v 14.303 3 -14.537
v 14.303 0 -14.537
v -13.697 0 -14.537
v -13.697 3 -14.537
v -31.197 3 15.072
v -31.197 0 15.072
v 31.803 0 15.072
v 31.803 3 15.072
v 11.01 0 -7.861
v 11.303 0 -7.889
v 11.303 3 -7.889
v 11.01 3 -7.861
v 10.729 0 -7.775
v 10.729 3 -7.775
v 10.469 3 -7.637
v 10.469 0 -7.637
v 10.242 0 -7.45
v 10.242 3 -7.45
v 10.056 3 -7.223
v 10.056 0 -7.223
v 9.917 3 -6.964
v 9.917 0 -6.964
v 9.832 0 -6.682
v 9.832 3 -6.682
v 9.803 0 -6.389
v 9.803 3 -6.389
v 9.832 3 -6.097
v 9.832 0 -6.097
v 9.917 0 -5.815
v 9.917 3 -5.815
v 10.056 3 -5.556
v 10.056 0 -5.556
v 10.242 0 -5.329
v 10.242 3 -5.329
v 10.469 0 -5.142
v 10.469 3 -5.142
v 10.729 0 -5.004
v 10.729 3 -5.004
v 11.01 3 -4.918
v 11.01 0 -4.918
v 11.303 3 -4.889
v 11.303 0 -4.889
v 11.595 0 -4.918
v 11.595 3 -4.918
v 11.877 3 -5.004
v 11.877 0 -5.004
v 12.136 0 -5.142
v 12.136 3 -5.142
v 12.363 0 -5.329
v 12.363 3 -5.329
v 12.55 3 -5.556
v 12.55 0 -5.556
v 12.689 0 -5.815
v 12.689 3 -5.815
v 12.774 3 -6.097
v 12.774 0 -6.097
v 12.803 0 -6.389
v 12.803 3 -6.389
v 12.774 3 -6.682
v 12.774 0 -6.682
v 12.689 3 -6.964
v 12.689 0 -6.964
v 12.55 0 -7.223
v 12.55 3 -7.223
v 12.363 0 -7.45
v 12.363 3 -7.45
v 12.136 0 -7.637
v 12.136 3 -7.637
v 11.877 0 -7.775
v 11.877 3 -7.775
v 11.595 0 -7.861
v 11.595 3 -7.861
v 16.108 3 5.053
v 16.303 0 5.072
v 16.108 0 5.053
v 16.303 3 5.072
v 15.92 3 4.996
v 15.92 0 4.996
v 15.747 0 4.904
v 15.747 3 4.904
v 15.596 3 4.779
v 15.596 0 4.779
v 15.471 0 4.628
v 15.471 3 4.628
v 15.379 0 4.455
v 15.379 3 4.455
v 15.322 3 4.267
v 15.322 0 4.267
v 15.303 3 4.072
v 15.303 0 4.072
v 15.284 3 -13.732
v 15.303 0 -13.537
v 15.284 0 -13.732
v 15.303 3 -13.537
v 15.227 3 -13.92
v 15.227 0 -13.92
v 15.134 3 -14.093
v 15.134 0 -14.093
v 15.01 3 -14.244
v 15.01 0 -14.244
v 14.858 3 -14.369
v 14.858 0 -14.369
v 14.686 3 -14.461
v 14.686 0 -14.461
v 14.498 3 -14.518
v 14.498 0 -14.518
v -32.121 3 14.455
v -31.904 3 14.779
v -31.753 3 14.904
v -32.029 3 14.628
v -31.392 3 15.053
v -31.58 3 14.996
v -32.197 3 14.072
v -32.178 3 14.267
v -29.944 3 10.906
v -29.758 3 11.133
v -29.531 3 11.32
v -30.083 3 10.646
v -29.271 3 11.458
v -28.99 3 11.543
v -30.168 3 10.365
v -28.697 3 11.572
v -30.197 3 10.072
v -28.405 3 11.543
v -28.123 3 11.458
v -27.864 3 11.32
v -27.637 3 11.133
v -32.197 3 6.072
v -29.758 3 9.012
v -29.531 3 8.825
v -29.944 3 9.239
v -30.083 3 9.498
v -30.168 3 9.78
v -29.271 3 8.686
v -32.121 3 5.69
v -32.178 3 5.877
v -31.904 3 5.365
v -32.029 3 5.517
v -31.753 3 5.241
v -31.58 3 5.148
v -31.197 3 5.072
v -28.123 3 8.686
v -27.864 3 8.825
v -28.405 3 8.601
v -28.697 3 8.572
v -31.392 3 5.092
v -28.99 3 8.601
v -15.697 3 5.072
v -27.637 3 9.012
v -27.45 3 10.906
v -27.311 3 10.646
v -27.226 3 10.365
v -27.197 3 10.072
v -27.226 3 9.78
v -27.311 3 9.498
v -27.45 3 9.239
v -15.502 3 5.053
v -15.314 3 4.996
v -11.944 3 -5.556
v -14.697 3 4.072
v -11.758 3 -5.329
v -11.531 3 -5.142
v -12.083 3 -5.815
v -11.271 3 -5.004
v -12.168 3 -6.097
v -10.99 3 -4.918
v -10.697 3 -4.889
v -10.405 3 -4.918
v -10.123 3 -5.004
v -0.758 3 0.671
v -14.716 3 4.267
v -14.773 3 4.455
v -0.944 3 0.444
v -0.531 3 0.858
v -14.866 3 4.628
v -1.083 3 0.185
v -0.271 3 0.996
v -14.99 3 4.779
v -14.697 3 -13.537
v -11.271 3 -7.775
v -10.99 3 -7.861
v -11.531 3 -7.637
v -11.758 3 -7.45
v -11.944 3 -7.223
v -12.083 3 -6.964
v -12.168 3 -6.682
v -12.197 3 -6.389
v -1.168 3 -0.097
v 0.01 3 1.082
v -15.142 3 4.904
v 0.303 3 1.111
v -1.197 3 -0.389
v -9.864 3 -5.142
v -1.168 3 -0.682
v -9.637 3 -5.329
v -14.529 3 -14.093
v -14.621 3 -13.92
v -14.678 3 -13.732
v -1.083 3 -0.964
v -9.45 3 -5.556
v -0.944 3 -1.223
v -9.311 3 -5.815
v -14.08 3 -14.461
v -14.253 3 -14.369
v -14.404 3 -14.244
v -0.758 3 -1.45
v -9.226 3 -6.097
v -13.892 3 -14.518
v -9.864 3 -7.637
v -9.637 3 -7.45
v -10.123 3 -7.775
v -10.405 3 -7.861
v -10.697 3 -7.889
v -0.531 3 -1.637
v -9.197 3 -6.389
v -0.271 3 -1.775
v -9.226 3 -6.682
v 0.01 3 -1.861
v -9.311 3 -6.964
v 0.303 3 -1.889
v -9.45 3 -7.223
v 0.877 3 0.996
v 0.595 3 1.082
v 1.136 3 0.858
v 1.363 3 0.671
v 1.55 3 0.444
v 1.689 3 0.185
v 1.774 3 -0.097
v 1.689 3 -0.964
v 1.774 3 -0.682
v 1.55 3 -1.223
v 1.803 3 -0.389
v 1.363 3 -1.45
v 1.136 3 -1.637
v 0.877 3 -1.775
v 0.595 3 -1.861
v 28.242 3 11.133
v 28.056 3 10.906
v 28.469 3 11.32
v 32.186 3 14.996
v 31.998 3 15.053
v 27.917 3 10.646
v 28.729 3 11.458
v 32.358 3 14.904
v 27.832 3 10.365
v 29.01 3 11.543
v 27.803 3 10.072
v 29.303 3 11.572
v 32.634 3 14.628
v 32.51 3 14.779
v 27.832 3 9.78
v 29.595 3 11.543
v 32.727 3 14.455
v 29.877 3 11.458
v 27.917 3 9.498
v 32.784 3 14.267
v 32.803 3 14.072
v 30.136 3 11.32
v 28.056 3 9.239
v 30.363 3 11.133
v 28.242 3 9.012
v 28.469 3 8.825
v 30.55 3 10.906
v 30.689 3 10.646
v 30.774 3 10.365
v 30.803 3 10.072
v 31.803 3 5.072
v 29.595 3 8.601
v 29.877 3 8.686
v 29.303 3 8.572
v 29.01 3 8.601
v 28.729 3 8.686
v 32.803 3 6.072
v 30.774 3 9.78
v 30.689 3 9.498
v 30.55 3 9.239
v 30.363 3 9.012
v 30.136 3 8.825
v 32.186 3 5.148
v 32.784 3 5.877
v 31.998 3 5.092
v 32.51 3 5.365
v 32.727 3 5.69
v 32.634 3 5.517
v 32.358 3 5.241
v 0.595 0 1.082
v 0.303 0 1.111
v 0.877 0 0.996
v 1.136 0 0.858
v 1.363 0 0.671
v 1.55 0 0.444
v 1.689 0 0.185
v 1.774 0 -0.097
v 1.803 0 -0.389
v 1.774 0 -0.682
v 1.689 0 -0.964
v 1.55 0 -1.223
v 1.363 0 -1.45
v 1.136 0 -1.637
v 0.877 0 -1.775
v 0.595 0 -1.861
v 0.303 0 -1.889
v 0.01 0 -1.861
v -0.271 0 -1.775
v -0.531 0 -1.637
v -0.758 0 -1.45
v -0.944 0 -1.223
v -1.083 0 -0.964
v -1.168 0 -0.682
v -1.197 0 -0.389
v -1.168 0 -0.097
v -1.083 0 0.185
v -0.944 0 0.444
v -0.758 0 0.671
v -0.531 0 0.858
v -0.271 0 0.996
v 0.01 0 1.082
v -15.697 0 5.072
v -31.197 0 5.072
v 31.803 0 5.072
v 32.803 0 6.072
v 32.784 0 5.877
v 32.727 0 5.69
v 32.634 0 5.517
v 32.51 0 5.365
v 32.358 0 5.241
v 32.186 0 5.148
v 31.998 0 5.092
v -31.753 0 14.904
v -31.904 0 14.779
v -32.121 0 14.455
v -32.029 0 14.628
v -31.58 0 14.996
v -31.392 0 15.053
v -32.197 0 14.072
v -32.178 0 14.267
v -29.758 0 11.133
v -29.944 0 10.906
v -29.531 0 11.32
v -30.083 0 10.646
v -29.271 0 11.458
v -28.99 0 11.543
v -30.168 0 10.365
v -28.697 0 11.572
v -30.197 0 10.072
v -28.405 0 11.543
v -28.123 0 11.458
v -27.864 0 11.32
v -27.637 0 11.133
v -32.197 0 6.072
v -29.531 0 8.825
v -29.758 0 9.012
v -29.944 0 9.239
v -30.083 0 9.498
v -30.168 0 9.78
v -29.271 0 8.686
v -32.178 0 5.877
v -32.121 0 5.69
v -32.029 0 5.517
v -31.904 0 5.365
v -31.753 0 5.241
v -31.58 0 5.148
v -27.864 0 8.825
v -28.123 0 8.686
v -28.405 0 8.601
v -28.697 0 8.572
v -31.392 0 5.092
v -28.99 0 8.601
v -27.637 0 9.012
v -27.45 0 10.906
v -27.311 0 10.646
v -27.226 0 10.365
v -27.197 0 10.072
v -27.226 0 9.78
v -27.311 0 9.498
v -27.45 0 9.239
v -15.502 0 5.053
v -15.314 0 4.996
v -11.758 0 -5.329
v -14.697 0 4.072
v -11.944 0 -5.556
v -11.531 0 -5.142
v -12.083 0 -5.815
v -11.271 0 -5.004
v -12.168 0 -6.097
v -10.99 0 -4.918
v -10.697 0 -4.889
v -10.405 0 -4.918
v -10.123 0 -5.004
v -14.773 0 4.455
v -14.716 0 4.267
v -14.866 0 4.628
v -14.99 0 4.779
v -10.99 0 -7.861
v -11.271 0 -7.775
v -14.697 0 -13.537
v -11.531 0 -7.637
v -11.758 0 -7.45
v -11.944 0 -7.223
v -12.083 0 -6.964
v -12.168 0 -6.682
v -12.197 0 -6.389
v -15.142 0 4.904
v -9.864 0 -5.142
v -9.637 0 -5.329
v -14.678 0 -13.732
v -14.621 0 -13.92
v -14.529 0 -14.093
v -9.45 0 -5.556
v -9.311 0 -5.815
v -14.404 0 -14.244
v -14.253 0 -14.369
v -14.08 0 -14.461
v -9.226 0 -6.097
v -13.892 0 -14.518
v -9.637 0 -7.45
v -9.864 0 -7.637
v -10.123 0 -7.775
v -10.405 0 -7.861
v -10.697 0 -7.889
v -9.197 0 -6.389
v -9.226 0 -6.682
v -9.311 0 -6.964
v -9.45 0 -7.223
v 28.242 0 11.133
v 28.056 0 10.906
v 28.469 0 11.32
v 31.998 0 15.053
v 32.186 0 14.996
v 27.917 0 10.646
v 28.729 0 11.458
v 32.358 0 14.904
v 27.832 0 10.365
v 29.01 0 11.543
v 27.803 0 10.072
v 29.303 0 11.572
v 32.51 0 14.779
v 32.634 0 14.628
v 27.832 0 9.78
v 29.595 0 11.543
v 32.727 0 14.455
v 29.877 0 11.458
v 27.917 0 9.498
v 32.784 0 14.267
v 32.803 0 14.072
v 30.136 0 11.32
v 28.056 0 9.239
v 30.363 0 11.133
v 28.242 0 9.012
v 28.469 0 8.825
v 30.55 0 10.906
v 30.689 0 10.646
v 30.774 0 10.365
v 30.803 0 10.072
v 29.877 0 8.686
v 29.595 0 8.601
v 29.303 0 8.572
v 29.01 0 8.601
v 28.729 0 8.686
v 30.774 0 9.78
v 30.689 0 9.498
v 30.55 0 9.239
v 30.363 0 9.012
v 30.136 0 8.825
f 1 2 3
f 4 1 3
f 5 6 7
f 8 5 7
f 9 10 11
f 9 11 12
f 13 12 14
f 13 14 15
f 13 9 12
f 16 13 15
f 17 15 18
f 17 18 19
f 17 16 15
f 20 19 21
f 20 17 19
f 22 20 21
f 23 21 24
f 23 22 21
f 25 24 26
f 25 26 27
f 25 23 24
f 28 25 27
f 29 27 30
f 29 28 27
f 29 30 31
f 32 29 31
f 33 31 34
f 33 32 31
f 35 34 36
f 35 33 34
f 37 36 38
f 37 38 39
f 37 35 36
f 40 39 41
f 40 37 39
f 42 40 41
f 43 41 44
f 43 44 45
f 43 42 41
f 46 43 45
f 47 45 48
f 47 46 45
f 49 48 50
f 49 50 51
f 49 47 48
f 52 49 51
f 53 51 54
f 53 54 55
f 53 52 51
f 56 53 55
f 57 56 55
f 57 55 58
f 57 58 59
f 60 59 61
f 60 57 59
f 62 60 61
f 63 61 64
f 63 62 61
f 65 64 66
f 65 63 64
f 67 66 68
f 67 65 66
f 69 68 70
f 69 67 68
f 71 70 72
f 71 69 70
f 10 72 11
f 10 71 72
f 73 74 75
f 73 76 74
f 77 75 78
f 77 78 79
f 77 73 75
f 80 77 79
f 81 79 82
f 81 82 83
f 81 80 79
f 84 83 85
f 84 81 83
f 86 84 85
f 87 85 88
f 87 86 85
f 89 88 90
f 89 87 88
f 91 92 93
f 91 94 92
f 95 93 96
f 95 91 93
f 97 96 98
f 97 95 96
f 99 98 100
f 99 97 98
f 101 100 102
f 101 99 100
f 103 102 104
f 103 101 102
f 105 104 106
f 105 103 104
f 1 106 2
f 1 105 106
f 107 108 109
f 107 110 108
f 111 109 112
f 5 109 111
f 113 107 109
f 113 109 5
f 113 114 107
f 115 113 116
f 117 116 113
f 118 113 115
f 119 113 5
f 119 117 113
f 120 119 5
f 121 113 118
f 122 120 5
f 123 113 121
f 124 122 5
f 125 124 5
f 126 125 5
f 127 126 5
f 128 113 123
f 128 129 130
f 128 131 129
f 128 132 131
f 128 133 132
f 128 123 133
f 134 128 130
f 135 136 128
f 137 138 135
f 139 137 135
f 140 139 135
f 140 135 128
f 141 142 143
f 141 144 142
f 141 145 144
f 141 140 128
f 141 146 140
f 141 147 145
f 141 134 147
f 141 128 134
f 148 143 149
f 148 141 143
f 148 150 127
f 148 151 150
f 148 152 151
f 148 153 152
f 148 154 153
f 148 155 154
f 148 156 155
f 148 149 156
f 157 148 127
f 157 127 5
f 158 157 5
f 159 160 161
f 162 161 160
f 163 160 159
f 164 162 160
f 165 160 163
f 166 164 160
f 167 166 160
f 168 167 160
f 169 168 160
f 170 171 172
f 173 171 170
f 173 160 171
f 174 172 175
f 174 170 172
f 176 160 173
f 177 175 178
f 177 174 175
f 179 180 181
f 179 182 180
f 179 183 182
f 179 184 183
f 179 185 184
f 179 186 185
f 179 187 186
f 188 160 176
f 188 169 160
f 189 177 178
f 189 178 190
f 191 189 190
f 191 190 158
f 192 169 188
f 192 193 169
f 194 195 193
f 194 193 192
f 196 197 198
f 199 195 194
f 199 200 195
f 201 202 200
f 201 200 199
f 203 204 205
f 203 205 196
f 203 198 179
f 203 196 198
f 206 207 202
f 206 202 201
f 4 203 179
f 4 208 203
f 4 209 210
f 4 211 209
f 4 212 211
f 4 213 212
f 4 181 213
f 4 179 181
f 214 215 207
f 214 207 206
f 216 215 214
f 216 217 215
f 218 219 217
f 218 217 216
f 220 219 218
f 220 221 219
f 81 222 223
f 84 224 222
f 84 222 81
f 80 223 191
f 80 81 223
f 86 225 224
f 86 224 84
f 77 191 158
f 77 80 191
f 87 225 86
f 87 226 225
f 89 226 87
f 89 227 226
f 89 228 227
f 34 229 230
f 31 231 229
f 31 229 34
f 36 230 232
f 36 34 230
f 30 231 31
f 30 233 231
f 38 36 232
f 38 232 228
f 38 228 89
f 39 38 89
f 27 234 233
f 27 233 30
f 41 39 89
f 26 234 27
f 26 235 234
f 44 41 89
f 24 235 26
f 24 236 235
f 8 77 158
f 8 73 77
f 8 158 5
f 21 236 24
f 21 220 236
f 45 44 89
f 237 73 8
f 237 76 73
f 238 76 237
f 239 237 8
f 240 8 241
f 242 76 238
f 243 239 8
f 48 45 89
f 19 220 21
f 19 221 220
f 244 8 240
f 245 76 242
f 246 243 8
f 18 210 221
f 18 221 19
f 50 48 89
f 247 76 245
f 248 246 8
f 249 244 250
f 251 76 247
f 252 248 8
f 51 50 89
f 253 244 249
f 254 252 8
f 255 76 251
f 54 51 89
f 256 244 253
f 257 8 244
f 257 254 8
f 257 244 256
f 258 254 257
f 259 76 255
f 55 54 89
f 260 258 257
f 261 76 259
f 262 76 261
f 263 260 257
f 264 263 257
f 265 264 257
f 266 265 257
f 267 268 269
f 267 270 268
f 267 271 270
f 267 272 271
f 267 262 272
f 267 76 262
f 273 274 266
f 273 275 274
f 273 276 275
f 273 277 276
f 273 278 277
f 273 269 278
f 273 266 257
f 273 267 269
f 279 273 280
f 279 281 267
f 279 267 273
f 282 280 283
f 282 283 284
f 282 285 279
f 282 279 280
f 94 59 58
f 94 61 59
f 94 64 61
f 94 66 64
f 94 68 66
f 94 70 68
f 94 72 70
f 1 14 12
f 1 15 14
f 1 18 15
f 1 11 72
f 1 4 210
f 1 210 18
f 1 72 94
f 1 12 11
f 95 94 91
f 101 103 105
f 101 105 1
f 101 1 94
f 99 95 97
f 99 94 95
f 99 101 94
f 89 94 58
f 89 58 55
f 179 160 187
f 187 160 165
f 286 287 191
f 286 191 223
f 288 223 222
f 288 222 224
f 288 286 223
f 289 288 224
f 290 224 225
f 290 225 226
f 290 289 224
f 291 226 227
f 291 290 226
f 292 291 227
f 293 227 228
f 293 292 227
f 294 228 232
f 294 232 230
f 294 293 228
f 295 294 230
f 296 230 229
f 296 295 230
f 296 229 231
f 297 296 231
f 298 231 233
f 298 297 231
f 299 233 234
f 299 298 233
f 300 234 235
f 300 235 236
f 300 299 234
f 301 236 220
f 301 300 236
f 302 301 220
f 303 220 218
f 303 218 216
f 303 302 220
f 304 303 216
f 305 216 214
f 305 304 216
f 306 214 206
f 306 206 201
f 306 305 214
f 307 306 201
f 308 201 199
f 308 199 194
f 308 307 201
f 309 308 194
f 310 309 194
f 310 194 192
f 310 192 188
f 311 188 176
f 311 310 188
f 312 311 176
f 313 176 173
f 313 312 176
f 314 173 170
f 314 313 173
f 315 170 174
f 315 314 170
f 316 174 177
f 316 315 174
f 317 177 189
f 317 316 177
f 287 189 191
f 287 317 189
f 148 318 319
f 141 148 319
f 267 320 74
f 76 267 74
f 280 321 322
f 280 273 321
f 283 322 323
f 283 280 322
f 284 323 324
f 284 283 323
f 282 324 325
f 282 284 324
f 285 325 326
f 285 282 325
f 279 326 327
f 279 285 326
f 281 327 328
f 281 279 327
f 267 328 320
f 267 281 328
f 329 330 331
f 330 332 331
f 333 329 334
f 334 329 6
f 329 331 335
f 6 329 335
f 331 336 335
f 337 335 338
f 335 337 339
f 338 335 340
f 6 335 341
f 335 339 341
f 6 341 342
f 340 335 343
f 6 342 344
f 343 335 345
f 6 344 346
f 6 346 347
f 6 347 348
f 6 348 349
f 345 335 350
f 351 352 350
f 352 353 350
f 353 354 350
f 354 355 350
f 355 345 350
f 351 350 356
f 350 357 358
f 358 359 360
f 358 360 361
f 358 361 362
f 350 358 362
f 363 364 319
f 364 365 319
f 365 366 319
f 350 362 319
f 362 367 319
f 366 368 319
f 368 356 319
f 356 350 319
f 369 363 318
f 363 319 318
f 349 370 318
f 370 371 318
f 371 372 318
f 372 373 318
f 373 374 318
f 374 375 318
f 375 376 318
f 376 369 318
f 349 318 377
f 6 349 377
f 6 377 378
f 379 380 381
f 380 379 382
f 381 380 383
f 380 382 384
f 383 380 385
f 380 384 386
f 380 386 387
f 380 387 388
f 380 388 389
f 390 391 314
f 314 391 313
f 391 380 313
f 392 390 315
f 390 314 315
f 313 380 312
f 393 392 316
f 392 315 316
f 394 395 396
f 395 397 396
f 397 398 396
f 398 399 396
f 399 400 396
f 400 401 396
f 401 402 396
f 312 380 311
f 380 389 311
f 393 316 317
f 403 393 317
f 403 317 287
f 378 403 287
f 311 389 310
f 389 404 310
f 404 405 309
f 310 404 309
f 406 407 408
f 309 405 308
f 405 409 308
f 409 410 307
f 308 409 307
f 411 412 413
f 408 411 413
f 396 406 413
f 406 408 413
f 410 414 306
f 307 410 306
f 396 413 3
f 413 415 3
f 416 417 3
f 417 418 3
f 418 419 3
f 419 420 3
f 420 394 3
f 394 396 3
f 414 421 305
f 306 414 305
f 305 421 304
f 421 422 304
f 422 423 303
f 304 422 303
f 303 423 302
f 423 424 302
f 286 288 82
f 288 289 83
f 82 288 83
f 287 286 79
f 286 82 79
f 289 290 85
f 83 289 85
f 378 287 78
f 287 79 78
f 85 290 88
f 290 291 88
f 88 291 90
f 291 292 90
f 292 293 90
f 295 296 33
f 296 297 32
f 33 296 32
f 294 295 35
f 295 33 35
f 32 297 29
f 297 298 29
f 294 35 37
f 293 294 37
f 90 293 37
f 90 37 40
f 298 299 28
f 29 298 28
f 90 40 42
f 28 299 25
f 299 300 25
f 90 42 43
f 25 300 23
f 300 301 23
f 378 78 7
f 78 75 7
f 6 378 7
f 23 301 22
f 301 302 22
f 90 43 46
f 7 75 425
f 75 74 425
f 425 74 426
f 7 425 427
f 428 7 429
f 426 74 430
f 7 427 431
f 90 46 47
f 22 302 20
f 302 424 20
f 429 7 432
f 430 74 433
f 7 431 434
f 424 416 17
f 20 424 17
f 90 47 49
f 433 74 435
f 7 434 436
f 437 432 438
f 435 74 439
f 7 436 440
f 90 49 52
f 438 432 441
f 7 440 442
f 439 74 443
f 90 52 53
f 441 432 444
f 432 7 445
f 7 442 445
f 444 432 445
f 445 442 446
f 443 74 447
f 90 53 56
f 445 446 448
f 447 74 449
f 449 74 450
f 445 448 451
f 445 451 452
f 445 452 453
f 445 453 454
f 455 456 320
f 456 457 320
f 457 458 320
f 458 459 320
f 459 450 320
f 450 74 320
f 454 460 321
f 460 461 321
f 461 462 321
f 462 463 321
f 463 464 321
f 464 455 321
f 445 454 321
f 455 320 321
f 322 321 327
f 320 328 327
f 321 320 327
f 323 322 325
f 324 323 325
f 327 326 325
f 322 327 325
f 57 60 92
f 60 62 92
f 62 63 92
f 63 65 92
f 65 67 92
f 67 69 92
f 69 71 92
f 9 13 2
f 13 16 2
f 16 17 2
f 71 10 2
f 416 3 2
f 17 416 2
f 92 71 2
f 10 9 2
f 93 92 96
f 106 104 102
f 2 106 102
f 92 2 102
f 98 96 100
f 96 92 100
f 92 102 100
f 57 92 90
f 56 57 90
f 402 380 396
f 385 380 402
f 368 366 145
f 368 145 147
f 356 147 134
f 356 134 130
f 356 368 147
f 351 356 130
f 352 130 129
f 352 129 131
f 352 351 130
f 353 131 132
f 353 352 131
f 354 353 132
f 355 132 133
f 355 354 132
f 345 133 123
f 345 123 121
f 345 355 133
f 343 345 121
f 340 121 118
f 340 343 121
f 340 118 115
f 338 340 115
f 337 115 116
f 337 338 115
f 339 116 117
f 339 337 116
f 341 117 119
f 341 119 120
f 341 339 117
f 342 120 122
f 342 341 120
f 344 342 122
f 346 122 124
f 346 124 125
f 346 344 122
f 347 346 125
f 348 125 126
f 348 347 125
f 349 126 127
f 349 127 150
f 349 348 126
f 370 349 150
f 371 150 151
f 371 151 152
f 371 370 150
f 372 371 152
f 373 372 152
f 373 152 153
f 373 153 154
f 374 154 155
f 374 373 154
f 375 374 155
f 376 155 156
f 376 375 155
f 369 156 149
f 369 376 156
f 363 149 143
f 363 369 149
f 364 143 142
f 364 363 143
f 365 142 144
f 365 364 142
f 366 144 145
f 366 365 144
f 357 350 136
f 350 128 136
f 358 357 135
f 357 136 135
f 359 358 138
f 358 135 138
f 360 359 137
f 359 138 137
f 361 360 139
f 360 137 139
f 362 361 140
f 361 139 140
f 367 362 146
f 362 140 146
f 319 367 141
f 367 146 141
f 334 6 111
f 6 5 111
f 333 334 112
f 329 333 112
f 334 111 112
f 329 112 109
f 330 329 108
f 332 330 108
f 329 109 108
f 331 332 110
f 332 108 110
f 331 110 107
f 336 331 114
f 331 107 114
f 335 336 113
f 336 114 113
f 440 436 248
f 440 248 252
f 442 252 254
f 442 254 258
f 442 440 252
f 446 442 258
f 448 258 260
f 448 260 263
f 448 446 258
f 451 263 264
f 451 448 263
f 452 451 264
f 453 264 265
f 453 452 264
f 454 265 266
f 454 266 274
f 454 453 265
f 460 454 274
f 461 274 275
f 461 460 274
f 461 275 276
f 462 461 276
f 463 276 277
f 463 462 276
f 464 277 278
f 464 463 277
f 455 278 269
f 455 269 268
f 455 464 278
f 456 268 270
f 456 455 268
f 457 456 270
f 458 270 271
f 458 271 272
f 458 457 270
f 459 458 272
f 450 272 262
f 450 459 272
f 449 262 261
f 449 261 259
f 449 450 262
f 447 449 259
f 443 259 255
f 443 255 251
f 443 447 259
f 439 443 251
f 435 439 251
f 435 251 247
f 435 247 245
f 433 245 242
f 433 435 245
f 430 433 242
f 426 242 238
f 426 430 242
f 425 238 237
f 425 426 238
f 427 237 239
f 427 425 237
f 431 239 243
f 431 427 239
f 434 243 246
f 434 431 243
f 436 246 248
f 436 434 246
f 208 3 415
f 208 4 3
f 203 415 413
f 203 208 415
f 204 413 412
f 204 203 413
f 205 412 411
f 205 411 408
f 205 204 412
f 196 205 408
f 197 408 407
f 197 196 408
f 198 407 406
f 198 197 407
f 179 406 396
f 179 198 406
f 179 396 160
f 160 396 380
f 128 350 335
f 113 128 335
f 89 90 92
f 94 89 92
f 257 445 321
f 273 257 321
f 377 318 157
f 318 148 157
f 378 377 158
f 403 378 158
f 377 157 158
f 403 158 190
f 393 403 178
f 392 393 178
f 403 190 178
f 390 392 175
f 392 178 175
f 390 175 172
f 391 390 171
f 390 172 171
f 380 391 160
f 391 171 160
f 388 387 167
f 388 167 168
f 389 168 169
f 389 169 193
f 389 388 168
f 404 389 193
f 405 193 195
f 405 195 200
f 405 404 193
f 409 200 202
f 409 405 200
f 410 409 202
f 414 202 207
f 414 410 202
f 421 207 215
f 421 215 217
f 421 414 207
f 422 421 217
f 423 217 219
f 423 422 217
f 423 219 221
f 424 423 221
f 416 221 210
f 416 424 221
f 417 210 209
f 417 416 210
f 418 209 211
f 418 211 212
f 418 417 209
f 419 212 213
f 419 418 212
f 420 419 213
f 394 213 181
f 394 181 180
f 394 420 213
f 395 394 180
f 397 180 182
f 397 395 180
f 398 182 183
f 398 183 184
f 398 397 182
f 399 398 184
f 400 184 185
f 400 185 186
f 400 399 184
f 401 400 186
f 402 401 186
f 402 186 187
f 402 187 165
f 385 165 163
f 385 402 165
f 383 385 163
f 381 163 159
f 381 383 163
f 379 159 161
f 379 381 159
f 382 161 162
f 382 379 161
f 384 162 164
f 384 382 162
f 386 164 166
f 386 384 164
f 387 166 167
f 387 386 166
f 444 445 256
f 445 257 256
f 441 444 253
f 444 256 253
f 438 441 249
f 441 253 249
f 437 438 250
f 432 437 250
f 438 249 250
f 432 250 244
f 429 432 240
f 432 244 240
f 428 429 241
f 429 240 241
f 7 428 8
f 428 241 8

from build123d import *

# Parameters (mm, degrees)
CROQUIS1_R              = 1.5
SALIENTE_EXTRUIR1_DEPTH = 3
REDONDEO1_R             = 1


with BuildPart() as part:
    # Croquis1 → Saliente-Extruir1 (new body)
    with BuildSketch(Plane(origin=(0, 0, 0), x_dir=(1, 0, 0), z_dir=(0, 1, 0))):
        Polygon((32.802827881, -15.07231132), (32.802827881, -5.07231132), (15.302827881, -5.07231132), (15.302827881, 14.537092733), (-14.697172119, 14.537092733), (-14.697172119, -5.07231132), (-32.197172119, -5.07231132), (-32.197172119, -15.07231132), align=None)
        with Locations(Location((29.302827881, -10.07231132, 0), (0, 0, 270))):
            Circle(CROQUIS1_R, mode=Mode.SUBTRACT)
        with Locations(Location((-28.697172119, -10.07231132, 0), (0, 0, 90))):
            Circle(CROQUIS1_R, mode=Mode.SUBTRACT)
        with Locations(Location((-10.697172119, 6.389486457, 0), (0, 0, 270))):
            Circle(CROQUIS1_R, mode=Mode.SUBTRACT)
        with Locations(Location((11.302827881, 6.389486457, 0), (0, 0, 90))):
            Circle(CROQUIS1_R, mode=Mode.SUBTRACT)
        with Locations(Location((0.302827881, 0.389486457, 0), (0, 0, 270))):
            Circle(CROQUIS1_R, mode=Mode.SUBTRACT)
    extrude(amount=SALIENTE_EXTRUIR1_DEPTH)

    # Redondeo1
    redondeo1_edges = [part.edges().sort_by_distance(p)[0] for p in [
        (-14.697172119, 1.5, 5.07231132),
        (-14.697172119, 1.5, -14.537092733),
        (15.302827881, 1.5, -14.537092733),
        (15.302827881, 1.5, 5.07231132),
        (32.802827881, 1.5, 5.07231132),
        (32.802827881, 1.5, 15.07231132),
        (-32.197172119, 1.5, 15.07231132),
        (-32.197172119, 1.5, 5.07231132),
    ]]
    fillet(redondeo1_edges, radius=REDONDEO1_R)


solid = part.part
